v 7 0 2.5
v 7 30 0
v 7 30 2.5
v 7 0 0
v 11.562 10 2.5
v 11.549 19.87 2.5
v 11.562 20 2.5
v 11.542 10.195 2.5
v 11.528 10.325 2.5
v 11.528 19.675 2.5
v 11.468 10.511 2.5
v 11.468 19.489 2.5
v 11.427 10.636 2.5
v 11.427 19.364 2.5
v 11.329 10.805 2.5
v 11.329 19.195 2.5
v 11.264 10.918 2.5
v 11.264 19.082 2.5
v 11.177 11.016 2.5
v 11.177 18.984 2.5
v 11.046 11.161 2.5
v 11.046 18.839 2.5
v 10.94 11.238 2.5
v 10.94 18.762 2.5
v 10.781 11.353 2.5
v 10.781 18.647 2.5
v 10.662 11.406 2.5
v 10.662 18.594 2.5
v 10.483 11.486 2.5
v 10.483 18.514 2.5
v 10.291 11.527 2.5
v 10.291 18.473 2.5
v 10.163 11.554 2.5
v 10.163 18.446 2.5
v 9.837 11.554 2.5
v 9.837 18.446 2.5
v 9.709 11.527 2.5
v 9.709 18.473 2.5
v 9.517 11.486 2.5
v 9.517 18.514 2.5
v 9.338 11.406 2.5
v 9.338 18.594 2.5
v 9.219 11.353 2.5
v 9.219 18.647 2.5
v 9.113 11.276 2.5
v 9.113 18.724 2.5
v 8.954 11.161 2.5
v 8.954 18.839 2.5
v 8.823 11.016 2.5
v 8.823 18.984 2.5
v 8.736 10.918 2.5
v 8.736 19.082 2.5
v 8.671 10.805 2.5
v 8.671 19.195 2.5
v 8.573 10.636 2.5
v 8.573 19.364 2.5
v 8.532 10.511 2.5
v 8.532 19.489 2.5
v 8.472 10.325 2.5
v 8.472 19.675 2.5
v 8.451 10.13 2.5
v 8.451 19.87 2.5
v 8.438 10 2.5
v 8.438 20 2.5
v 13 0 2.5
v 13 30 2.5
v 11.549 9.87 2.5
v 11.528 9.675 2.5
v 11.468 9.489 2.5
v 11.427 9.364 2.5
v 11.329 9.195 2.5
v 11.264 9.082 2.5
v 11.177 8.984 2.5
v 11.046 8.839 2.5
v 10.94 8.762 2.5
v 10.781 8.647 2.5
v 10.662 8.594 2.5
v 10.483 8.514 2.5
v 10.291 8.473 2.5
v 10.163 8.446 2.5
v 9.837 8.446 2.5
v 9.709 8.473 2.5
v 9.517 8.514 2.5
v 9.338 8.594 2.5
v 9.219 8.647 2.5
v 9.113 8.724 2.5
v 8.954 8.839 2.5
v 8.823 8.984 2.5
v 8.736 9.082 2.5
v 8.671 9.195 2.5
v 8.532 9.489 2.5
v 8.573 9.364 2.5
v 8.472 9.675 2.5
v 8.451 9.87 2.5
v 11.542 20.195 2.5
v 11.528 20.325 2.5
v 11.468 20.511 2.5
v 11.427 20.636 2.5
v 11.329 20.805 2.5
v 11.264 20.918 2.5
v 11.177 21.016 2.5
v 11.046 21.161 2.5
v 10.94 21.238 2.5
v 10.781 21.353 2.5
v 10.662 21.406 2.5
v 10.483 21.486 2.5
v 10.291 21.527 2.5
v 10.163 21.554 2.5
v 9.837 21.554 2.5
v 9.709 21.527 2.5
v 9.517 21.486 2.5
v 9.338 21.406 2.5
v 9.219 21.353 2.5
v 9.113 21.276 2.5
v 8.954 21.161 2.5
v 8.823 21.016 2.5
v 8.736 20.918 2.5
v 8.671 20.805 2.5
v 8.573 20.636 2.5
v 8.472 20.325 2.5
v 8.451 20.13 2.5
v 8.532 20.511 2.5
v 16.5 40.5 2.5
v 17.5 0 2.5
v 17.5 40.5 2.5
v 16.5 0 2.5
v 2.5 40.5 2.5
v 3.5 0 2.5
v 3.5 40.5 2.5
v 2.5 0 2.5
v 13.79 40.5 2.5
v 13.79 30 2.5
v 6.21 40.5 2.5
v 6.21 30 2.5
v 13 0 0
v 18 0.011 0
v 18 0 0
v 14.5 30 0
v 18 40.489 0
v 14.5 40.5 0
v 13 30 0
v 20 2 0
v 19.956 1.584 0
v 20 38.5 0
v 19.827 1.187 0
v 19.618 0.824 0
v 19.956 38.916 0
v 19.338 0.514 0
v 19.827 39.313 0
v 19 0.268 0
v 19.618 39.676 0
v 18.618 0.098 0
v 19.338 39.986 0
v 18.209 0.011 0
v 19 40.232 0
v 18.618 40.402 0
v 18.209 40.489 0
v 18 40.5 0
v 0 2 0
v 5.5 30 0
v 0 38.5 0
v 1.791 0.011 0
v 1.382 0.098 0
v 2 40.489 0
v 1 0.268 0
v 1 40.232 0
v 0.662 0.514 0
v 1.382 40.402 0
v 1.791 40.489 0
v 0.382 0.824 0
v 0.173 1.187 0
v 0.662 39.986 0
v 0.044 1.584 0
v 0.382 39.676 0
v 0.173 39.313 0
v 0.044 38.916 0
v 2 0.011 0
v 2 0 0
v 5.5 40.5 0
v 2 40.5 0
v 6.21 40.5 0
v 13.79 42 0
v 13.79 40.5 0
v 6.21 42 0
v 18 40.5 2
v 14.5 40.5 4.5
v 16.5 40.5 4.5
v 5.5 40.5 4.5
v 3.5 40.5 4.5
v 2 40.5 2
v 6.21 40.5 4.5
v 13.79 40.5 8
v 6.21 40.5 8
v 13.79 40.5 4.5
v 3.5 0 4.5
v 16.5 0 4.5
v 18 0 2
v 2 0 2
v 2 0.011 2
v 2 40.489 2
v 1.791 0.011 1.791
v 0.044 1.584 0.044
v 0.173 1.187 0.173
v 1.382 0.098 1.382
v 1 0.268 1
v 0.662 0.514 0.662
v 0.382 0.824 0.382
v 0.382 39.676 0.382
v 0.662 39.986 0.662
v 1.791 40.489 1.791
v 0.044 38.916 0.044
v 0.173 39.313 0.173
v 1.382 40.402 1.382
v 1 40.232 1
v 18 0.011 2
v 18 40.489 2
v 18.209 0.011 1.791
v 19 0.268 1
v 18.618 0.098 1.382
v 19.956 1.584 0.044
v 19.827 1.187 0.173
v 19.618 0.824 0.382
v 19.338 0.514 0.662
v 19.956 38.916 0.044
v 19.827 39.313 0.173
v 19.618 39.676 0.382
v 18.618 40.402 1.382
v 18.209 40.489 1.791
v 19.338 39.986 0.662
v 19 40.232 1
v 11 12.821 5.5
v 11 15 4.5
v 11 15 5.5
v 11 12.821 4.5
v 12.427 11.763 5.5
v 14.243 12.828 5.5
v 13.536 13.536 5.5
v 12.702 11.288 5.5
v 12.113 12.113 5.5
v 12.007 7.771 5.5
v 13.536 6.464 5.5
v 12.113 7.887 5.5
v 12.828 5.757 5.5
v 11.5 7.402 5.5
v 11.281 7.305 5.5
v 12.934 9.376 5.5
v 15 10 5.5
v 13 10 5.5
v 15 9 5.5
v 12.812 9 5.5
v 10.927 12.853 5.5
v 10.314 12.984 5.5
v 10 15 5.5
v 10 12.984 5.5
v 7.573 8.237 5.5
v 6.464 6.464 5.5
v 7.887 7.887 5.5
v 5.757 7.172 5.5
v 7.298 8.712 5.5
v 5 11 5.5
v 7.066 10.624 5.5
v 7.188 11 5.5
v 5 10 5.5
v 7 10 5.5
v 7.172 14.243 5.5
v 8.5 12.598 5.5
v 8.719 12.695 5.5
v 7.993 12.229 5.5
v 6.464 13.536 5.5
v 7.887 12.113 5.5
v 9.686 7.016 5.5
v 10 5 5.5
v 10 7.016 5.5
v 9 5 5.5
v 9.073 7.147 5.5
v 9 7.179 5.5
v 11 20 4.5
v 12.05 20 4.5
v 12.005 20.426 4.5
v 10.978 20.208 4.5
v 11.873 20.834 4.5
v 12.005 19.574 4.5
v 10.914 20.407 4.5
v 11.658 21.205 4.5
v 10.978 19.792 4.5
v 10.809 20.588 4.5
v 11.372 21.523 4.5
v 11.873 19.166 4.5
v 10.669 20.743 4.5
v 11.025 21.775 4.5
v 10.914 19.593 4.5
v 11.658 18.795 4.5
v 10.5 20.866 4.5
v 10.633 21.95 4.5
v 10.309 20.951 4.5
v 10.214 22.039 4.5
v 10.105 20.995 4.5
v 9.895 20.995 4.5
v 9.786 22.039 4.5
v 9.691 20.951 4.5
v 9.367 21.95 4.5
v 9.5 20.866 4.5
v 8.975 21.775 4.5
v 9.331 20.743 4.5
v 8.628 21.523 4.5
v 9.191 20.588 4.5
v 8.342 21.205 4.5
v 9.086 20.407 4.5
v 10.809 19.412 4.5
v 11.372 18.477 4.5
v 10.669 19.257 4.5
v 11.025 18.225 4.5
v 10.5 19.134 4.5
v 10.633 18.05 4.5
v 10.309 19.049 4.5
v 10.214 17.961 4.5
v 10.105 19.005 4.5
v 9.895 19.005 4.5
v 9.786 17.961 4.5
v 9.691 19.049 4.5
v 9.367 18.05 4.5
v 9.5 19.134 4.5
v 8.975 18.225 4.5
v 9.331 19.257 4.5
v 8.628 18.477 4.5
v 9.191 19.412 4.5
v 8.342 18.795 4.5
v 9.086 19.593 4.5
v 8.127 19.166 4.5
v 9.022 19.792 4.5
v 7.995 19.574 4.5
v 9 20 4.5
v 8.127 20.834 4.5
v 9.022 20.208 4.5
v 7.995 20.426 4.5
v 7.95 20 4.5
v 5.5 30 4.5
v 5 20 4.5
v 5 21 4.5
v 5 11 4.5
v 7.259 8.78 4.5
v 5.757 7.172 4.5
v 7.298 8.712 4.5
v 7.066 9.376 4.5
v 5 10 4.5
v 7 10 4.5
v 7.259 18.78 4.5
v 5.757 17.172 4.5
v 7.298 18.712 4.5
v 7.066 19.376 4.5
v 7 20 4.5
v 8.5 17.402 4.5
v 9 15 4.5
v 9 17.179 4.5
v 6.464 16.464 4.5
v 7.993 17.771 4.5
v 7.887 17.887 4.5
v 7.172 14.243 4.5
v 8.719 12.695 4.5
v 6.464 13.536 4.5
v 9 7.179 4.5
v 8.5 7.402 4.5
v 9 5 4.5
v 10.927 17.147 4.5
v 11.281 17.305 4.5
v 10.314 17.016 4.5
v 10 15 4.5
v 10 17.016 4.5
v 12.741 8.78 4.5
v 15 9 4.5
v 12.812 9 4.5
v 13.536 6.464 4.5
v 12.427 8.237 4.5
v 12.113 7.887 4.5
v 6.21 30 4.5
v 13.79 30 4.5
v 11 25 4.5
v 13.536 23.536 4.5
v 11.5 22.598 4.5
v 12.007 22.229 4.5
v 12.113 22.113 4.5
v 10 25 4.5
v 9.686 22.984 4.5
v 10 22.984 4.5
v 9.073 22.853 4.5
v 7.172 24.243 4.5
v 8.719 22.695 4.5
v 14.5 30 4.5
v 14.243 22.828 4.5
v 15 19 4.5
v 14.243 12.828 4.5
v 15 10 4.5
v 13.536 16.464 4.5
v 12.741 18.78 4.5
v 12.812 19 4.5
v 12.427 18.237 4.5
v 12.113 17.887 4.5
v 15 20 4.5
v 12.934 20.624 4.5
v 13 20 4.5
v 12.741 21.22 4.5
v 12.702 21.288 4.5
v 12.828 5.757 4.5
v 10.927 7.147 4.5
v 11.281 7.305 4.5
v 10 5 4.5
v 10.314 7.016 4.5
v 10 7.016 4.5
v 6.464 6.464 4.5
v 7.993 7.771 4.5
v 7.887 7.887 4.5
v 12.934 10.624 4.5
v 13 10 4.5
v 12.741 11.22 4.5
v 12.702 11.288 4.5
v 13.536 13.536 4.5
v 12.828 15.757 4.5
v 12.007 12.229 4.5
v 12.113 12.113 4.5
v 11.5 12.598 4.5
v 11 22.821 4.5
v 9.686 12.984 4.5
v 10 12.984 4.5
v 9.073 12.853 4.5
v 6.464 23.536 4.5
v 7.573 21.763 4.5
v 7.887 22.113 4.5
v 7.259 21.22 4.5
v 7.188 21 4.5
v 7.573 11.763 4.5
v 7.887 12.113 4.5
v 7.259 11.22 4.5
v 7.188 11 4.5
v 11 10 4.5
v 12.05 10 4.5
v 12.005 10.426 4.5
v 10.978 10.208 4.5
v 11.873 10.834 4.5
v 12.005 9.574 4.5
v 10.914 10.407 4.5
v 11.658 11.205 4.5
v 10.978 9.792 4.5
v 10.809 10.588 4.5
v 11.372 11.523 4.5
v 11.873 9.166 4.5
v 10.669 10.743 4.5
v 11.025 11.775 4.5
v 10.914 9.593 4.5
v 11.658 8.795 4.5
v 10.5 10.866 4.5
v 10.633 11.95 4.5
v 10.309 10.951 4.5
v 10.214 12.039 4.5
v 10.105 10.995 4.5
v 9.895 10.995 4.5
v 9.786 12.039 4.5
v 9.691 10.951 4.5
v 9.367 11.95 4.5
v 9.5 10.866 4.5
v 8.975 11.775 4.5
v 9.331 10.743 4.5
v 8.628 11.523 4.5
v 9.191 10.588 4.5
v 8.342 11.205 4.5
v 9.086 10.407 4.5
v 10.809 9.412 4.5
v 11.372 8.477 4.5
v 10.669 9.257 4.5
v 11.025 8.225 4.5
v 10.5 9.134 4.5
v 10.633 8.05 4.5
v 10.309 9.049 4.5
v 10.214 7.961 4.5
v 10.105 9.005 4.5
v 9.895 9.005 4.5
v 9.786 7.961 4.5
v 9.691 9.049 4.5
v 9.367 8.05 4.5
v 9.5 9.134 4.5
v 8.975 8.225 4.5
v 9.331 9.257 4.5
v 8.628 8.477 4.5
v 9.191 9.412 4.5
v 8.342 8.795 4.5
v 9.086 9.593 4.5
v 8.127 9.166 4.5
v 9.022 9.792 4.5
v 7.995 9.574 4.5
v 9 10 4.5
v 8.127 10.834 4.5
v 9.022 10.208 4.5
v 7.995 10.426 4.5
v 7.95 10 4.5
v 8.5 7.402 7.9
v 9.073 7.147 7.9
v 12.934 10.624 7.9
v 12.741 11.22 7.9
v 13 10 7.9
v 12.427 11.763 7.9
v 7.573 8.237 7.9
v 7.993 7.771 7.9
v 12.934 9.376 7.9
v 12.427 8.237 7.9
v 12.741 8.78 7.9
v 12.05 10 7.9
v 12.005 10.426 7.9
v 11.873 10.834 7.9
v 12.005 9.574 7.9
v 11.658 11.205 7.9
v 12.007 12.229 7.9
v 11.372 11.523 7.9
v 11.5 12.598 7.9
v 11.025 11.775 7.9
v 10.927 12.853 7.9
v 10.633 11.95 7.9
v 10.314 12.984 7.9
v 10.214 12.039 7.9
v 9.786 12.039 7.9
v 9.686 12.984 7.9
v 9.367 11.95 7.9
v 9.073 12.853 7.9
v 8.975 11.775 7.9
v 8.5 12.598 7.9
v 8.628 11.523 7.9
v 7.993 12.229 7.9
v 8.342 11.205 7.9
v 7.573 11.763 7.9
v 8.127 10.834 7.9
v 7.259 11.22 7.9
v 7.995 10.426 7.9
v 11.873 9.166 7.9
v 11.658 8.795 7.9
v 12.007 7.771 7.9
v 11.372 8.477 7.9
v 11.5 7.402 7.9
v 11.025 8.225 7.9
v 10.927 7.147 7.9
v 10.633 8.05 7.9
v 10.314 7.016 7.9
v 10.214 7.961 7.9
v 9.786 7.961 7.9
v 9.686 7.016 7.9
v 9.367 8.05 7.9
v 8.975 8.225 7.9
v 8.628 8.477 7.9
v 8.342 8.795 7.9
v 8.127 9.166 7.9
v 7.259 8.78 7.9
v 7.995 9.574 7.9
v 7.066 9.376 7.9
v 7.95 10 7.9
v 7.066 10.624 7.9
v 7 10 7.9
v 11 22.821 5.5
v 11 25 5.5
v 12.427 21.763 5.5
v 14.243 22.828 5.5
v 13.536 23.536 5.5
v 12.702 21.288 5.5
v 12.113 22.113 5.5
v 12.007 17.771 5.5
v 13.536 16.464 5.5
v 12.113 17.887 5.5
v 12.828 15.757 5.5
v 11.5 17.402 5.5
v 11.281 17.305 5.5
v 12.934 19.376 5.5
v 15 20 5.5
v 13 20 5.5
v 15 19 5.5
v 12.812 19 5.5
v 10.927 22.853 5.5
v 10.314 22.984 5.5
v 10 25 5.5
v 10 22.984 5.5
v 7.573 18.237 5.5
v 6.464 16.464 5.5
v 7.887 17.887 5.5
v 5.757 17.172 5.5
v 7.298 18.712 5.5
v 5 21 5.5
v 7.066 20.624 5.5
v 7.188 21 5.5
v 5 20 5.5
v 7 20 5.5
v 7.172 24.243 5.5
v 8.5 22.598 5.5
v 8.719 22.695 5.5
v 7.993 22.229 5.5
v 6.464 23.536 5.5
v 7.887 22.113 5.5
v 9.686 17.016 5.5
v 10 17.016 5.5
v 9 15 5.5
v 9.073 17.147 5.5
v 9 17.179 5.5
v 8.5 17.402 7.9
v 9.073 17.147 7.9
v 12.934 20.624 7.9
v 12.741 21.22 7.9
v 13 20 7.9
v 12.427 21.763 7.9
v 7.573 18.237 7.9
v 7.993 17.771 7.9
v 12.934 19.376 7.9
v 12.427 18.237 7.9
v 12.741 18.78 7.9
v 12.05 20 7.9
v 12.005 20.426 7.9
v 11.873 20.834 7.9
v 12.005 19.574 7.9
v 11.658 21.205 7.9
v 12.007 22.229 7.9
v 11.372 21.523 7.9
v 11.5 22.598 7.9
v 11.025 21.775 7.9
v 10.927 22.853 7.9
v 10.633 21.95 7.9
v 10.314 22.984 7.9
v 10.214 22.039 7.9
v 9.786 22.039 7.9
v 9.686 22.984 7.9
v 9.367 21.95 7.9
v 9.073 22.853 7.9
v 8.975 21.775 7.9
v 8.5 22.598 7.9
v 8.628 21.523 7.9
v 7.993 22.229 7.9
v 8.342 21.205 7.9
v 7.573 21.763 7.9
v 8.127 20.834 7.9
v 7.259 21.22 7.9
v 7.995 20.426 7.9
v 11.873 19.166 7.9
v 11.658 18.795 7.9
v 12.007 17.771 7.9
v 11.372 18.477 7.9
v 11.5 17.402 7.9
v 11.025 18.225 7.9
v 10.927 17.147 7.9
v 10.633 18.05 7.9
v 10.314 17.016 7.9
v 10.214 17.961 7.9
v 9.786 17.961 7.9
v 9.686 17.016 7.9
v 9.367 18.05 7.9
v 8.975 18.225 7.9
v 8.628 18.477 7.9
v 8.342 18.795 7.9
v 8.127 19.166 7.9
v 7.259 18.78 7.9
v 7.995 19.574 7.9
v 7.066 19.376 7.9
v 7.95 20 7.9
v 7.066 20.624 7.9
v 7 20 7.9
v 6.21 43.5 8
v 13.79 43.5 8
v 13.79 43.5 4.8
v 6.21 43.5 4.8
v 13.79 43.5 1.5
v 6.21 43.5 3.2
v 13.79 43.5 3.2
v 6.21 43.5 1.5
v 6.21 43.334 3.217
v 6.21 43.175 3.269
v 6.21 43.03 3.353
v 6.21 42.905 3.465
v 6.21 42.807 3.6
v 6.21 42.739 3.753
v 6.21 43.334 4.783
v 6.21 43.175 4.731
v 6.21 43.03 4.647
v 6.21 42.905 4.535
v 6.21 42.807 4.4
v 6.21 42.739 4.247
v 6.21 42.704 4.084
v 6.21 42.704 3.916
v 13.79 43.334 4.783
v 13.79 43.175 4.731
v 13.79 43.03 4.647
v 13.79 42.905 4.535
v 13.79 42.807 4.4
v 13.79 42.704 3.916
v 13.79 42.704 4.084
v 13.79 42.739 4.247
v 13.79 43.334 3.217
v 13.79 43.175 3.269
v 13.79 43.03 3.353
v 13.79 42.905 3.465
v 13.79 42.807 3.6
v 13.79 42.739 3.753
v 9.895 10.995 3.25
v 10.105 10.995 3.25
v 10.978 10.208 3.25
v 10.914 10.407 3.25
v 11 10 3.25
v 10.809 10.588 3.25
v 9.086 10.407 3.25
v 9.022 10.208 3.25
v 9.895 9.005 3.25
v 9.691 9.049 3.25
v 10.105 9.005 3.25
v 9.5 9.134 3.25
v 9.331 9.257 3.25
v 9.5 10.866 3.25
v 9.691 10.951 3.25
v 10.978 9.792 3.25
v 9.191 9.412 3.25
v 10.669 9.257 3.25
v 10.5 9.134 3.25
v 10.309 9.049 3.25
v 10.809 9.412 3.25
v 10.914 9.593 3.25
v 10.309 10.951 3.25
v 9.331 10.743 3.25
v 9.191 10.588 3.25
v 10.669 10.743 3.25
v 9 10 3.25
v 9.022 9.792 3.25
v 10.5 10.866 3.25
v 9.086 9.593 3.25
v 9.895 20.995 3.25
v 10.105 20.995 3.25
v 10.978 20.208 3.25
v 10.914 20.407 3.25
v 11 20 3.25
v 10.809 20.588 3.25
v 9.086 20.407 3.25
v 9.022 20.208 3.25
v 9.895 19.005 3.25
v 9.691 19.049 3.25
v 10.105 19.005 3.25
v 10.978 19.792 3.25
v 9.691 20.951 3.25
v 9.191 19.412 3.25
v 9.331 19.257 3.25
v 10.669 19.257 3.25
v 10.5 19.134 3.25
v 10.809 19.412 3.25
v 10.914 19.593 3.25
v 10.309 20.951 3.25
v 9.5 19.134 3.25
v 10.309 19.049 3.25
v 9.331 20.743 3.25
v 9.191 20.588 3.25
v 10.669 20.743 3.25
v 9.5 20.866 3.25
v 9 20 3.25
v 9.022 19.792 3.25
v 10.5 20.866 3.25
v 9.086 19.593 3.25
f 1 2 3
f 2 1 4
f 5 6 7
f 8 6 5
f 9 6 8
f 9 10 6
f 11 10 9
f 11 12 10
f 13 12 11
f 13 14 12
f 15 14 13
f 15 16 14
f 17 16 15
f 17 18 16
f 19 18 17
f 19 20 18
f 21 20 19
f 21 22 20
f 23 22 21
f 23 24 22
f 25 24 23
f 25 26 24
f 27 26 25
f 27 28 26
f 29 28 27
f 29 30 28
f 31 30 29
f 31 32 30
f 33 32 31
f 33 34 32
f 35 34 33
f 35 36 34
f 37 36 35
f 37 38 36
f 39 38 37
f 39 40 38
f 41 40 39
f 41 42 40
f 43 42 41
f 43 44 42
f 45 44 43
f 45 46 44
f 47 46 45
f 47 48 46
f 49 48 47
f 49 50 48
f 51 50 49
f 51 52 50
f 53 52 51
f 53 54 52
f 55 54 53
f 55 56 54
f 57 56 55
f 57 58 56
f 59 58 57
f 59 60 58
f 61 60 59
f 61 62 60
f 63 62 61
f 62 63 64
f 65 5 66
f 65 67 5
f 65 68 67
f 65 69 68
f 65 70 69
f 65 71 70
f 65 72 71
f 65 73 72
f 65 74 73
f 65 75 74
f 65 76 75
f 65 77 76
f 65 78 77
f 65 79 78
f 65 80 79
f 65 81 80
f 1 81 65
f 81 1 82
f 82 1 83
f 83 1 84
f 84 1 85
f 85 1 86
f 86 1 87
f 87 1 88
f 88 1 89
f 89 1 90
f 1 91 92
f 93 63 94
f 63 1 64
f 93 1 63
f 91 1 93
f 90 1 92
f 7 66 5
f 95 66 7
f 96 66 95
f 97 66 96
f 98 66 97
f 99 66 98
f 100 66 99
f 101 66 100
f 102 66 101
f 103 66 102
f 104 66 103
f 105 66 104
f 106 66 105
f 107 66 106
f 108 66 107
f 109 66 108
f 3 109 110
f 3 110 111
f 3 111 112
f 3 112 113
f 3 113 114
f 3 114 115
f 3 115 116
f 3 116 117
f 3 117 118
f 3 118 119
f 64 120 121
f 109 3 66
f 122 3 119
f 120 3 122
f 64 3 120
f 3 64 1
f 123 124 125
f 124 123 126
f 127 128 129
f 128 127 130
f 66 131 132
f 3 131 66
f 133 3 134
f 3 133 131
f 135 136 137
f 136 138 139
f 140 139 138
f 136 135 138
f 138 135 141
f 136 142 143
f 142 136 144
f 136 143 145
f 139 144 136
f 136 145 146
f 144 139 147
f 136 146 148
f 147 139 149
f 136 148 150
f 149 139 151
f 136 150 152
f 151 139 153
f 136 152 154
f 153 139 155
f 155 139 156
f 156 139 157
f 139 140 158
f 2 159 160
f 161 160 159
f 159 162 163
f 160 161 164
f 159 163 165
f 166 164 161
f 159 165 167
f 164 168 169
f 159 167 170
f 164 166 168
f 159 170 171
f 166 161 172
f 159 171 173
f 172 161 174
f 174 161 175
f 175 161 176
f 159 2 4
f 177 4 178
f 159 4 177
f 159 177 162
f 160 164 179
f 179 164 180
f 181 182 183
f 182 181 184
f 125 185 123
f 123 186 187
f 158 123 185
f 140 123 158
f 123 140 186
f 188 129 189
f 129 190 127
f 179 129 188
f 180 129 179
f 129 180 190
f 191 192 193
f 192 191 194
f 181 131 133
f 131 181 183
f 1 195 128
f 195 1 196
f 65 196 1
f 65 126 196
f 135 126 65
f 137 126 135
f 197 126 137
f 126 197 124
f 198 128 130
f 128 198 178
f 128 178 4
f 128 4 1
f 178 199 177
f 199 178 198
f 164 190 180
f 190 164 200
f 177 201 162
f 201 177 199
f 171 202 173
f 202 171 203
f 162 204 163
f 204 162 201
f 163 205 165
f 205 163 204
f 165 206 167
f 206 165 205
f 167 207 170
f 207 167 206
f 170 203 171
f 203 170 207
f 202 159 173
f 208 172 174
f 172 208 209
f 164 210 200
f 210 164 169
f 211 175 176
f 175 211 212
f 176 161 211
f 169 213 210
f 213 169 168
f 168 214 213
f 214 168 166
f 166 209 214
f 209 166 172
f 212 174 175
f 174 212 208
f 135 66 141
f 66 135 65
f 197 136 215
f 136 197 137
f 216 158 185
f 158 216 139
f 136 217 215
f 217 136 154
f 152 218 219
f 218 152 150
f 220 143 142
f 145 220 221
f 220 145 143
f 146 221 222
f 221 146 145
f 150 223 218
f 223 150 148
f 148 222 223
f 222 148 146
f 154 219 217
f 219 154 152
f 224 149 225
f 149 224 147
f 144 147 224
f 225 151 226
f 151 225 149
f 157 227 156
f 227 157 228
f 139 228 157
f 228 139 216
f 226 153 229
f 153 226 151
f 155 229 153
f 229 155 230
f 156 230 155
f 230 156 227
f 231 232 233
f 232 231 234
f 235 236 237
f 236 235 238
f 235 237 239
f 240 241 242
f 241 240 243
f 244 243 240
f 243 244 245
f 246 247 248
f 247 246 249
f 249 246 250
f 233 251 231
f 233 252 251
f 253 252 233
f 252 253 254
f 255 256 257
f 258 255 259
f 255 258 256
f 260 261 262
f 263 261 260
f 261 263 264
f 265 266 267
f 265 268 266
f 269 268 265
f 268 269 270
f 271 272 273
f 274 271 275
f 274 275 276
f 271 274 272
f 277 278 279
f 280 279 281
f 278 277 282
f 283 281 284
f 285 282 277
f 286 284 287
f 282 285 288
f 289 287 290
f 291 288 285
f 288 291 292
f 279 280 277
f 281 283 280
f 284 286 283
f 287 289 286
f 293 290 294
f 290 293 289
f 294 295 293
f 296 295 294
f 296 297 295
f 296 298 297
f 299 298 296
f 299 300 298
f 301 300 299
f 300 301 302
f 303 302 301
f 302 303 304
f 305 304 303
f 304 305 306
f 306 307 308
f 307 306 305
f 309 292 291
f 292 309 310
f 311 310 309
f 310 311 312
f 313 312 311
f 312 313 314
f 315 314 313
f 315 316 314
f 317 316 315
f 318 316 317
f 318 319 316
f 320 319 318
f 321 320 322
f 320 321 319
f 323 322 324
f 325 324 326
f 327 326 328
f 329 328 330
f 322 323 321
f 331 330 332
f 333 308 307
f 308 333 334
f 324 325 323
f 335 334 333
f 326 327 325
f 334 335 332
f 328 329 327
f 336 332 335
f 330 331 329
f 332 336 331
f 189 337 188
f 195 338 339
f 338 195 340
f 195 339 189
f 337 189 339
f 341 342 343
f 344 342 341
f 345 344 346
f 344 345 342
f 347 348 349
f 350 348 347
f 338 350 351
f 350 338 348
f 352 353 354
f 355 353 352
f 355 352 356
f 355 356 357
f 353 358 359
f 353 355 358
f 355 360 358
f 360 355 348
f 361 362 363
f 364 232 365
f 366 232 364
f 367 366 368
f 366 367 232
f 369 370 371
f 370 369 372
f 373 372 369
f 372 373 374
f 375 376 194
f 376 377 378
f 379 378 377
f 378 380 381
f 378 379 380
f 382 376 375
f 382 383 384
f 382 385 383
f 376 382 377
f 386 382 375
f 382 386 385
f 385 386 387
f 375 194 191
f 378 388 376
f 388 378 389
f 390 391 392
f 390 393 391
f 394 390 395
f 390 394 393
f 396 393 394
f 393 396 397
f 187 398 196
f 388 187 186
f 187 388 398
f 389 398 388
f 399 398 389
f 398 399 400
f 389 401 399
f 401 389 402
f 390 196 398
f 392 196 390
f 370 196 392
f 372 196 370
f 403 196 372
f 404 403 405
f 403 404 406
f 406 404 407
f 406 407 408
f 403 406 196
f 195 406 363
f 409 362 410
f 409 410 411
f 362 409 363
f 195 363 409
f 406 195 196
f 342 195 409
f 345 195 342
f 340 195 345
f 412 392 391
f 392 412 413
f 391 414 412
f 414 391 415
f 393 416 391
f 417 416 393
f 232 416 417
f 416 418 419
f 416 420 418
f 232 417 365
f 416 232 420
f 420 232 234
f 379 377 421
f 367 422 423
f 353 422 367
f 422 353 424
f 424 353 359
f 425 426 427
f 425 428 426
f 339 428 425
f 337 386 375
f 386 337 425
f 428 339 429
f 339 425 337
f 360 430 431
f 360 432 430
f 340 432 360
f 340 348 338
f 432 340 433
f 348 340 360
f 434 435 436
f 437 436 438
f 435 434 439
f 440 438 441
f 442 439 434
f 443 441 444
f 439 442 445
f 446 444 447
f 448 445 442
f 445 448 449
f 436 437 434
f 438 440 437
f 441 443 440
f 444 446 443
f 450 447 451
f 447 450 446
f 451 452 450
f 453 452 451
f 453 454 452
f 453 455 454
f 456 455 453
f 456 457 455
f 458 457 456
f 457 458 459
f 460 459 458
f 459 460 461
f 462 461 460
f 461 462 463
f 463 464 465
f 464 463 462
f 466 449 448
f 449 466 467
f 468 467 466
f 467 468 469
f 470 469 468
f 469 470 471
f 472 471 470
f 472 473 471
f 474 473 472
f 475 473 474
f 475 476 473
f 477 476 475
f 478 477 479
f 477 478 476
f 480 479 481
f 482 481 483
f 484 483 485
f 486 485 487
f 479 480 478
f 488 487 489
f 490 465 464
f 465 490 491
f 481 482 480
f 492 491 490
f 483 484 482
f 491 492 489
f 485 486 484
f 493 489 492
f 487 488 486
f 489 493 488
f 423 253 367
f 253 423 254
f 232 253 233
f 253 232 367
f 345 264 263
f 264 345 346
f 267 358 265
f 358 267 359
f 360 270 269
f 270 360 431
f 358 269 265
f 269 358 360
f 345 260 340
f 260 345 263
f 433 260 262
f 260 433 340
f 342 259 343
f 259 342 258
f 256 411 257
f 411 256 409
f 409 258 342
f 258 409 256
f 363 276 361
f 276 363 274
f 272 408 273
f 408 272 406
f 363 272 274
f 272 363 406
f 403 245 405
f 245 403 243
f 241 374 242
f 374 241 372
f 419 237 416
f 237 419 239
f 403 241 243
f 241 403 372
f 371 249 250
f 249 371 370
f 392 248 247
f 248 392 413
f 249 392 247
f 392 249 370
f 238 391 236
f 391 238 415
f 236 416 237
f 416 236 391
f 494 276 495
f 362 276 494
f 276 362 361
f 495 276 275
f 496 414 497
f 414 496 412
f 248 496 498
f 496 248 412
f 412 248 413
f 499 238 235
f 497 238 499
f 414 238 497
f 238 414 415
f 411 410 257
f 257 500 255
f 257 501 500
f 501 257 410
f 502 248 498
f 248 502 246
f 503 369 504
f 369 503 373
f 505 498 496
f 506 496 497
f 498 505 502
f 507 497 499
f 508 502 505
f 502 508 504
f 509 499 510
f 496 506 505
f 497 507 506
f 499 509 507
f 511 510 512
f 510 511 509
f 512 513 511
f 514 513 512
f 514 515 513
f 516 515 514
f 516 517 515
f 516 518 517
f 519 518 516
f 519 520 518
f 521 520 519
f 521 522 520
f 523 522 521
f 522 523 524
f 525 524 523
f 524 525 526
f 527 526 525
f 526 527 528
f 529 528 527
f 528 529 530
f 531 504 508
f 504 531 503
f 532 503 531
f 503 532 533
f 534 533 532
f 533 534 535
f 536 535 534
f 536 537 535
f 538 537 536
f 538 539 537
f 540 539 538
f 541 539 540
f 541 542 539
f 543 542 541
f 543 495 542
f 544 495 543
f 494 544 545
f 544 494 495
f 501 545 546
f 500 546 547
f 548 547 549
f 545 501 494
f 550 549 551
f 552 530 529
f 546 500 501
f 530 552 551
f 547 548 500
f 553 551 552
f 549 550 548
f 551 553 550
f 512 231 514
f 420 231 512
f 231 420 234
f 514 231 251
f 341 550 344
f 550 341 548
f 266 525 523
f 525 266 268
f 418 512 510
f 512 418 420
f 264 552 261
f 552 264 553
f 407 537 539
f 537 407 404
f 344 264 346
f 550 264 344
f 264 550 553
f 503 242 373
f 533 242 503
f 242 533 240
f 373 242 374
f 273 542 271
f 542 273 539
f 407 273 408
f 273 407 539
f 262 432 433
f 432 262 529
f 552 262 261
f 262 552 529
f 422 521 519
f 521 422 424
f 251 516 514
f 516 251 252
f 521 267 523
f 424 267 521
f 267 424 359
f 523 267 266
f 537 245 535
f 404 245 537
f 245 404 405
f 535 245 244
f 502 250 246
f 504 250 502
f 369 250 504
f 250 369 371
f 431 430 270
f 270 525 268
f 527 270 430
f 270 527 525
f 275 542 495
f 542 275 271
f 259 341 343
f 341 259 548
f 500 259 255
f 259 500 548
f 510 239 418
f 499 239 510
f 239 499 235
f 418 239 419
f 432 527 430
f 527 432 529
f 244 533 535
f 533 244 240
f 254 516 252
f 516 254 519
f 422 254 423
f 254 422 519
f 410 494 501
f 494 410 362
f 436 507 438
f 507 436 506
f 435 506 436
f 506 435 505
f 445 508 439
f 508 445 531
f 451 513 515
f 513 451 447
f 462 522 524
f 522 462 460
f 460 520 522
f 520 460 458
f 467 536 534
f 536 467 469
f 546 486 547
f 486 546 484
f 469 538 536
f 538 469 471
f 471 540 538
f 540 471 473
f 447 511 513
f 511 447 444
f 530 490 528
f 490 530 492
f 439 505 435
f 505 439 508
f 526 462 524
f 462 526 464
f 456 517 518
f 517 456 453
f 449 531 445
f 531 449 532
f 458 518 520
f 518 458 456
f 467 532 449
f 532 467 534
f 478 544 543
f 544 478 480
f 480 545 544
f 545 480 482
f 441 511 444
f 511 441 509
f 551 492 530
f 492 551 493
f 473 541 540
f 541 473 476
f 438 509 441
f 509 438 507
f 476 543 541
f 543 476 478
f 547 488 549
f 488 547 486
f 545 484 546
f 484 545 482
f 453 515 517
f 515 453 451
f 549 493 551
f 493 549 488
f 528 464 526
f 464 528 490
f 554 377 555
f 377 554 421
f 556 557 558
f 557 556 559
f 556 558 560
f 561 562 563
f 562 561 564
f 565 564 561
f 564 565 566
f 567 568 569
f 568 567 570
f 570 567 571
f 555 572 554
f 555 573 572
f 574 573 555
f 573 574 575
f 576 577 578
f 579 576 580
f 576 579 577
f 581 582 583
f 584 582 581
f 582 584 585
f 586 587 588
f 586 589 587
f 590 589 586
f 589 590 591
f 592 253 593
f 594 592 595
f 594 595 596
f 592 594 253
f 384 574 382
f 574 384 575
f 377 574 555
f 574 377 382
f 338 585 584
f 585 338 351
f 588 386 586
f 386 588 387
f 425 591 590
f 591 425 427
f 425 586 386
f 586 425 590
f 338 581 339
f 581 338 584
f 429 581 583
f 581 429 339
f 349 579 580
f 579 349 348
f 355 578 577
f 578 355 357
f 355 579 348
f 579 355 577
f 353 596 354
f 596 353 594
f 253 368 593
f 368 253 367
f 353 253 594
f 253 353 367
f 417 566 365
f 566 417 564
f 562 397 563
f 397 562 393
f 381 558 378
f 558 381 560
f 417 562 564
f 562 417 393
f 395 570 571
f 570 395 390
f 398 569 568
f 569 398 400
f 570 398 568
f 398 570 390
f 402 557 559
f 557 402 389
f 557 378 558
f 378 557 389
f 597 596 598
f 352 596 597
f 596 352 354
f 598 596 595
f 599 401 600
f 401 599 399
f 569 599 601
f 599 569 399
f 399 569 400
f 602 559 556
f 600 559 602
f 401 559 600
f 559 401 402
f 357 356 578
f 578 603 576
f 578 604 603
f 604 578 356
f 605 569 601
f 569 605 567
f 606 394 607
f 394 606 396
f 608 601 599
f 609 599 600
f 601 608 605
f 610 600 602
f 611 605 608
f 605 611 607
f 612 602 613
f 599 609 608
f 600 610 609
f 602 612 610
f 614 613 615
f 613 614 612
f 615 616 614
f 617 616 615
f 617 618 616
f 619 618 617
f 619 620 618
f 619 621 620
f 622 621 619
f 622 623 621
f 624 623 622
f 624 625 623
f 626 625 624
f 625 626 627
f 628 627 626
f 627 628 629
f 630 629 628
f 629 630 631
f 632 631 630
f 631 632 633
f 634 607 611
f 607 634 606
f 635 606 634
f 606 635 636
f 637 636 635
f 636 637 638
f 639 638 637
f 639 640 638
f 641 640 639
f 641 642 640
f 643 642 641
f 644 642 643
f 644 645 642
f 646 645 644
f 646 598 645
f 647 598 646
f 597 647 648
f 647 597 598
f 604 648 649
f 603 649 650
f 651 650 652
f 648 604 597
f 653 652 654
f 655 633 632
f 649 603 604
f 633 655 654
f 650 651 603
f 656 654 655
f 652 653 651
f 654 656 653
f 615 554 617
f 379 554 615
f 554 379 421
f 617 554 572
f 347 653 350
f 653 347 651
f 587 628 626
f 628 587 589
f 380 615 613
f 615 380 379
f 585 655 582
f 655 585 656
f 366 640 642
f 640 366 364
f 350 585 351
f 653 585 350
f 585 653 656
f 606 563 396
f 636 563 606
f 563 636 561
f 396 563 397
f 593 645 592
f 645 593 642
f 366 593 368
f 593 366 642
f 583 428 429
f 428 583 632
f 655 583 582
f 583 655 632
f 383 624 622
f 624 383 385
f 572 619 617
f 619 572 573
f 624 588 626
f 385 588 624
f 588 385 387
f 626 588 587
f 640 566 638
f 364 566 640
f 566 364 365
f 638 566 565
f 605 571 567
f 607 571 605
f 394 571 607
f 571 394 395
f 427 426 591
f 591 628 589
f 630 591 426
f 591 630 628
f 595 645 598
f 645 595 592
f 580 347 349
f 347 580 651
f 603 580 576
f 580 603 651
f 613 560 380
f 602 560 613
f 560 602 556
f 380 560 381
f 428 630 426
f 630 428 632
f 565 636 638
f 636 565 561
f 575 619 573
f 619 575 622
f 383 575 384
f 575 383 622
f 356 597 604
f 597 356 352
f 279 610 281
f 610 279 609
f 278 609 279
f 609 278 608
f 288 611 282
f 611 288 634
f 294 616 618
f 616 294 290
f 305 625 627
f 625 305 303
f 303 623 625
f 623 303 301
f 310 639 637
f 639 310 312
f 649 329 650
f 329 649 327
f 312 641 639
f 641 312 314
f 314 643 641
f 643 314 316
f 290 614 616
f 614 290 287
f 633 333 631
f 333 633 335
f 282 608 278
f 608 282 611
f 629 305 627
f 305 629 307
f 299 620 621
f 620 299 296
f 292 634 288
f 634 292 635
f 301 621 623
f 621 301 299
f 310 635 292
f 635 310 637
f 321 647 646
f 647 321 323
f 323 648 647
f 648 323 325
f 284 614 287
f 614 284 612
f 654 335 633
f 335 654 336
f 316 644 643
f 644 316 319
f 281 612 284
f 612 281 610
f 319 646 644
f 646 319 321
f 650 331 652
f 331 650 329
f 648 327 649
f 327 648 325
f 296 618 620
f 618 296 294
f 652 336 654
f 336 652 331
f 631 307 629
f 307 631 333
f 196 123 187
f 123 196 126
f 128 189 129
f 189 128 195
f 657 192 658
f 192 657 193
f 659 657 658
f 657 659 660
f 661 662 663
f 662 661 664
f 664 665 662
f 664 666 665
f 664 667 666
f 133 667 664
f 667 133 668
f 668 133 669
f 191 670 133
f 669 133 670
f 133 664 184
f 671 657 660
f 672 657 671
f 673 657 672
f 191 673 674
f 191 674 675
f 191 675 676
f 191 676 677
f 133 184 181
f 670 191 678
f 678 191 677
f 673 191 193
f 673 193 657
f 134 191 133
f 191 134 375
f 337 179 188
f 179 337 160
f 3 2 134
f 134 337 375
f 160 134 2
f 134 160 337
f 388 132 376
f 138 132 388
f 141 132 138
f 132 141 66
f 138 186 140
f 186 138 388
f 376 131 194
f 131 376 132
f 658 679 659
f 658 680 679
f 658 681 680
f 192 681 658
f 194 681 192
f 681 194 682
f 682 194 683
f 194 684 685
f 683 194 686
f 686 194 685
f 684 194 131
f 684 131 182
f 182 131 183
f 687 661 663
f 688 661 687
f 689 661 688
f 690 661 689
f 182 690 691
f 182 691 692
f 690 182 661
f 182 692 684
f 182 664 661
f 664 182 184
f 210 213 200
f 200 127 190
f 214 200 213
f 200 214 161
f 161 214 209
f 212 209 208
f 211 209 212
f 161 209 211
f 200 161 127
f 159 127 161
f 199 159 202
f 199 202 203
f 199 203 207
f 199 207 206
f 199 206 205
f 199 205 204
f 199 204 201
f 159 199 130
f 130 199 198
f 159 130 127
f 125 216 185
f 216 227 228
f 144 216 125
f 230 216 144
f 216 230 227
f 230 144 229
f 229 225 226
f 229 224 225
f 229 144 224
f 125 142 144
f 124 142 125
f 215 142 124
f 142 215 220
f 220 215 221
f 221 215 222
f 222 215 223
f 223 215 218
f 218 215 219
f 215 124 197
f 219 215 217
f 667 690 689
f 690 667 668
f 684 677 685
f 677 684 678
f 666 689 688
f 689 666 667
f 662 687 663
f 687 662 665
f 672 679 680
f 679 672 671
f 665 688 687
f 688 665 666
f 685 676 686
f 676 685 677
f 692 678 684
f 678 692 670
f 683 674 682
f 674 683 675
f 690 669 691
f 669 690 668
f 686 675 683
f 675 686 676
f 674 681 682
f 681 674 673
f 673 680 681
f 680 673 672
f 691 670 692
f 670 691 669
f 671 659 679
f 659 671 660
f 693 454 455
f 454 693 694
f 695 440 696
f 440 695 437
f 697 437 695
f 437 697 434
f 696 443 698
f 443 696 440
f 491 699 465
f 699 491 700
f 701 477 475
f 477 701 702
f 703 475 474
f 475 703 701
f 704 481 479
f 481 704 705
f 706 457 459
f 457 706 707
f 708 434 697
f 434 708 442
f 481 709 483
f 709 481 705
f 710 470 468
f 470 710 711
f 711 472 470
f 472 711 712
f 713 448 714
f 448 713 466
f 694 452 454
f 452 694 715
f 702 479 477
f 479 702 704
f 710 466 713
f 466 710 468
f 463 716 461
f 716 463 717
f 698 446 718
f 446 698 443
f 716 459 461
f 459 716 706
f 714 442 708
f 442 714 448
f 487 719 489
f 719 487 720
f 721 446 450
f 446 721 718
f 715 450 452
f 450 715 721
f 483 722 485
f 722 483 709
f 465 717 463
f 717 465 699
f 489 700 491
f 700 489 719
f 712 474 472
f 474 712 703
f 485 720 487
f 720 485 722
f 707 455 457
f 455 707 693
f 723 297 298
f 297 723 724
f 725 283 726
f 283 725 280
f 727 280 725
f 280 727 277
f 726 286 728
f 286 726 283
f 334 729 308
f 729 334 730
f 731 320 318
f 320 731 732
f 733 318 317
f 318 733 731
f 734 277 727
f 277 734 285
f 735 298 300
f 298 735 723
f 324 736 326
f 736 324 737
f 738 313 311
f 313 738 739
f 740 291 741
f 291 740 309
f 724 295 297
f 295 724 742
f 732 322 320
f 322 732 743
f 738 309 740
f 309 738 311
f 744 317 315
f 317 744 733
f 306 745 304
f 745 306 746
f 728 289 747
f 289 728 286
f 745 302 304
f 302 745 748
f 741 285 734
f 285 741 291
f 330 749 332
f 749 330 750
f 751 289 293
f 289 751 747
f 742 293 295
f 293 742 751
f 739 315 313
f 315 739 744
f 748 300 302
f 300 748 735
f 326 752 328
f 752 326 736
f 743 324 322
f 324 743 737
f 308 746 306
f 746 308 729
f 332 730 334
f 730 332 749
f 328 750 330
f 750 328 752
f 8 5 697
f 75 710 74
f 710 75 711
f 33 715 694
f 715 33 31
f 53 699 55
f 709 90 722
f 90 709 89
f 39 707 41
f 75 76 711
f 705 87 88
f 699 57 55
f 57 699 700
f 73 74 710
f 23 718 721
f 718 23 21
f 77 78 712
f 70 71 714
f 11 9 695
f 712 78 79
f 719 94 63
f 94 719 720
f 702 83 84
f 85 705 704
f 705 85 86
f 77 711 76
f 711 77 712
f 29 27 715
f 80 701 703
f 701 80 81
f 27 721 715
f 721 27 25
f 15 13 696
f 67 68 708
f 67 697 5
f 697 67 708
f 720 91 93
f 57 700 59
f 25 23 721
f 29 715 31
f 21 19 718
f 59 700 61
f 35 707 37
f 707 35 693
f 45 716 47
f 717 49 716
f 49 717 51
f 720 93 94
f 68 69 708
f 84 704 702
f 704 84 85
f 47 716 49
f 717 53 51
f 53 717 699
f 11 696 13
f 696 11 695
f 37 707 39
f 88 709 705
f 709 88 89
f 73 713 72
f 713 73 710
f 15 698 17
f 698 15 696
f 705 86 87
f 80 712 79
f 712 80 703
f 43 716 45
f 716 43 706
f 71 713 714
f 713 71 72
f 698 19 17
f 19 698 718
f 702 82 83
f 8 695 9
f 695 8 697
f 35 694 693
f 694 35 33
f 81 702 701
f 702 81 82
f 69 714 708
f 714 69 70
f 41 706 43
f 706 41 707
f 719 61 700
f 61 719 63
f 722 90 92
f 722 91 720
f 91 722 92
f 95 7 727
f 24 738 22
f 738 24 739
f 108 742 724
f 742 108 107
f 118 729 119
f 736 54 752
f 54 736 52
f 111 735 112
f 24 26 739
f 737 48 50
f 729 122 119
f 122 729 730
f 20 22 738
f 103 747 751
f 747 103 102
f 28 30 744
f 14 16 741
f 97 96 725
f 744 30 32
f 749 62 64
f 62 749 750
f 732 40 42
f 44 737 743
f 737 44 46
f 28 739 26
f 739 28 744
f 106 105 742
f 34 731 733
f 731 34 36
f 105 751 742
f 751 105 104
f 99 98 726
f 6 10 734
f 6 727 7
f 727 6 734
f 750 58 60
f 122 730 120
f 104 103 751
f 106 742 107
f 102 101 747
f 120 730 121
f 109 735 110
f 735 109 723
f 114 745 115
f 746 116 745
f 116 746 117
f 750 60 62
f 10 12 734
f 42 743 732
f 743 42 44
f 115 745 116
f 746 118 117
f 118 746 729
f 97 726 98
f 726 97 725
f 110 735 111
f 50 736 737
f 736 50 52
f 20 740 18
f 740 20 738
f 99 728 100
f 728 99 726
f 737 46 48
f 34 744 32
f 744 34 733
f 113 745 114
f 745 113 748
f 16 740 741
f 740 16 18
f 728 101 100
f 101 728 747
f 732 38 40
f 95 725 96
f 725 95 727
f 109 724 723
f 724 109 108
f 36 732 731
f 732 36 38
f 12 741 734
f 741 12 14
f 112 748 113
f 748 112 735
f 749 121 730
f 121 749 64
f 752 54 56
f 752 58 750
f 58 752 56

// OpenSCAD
// Catepilar S61 - Clip to hold Military Case
// 2026-04-13, Ondrej DURAS (dury) NOKIA
// prichytenie mobilu : priviazane o snurku drzi vojenske ocharrne puzro na mobilny telefon CatS61
// dva moduly; slider - spodna zasuvna cast a cover - zakrytka zvierajuca snurku k slideru.
// pevne pojenie bude realizovane dvoma samoreznymi skrutkami
//include <003-roundedCube-lib.scad>

/* [Viever] */
preview="basic";    // [basic,cover,slider,plate]
distance=5;        // [0:1:50] vzdialenost kritky od podlozky
$fn=30;

/* [Dimensions] */
spi=0.1;            // spacing povrchu vnutornej suciatky sucheho spoja - pravidlo: I sa strka do O
spo=0.1;            // spacing povrchu vonkajsej suciastky sucheho spoja - I treba obvikle zuzit, O rozsirit aby sa veci do seba dali zasunut
roundedRadius=2.0;  // polomer zabrusenia hran slidera
roundedRadiusBig=4.5; 
sliderDepthM=40.5;  // celkova hlbka Slidera ... v podstate sirka, hlavny rozmer
sliderDepthL=30.0;  // hlbka lavej(blizsie k X)-celistvej casti slidera
sliderDepthR=10.5;  // hlbka pravej(dalej od X)-zarezanej casti slidera 
sliderWidthM=20.0;  // celkova sirka slidera
sliderWidthT=13.0;  // sirka horneho-noseneho pasu slidera
sliderWidthB=7.0;   // sirka spodneho-leziaceho pasika slidera (su dva, kazdy 6.0mm podla originalu, ale skusime 7.0mm)
sliderHightM=4.5;   // celkova vyska slidera - oboch pasikov dohromady (B+T=M !!!)
sliderHightB=2.5;   // vyska spodnych-leziacich dvoch pasikov slidera
sliderHightT=2.0;   // vyska horneho-noseneho pasika slidera
sliderCutLen=10.5;  // dlzka zarezu do slidera .. su dva
sliderCutTck=0.71;  // hrubka (Tick) zarezu do sldera .. su dva (merany original 1.5, 1.51 funkcny)
sliderCutDis=5.5;   // vzdialenost okraja zarezu od okraja slidera
sliderTipWid=8.0;   // sirka drziaceho hrotu i vyhynacieho jazycka (8.0 funkcny)
sliderTipDis=6.0;   // okraj jazycka/hrotu od okraja slidera // druhy okraj vyrezu // =poloha+sirka vyrezu
sliderTipDep=3.0;   // v podstate hrubka hrotu
sliderTipHig=8.0;   // vyska hrotu od podlozky
sliderCylRad=8.0;   // polomer cylindra, sluziaceho k pruznemu vyrezu
screwBodyM=2.0;     // priemer tela skrutky asi 2.0mm, este premerat
screwHeadM=5.0;     // ten najvacsi priemer hlavy skruptky, merany na asi 5.0, premerat este raz
screwHeadH=2.0;     // vyska hlavy skrutky
ferulaTick=1.0;     // hrubka steny ferule, teda kuzela s dierou, do ktorej pojde skrutka
ferulaHolders=8;    // pocet drziacikov, ktore zvysuju pevnost refule - zvacsuju plochu zakladne ktorou vznika prepoj medzi ferulou a suciastkou
ferulaHight=7.0;    // REFERENCNY rozmer - vyska vnutorneho pristoru pod coverom/krytkou ... urcuje vysku krytku
coverTick=2.0;      // hrubka materialu cover-a
cbArm=80.0;         // dlzka paky pacidla
cbTip=5.0;          // dlzka hrotu pacidla
cbRad=5.0;          // polomer zaoblenia pacidla
cbExt=5.0;          // sirka pacidla



/* [Colors] */
colorSliderBottom="#908010"; // farba spodnych dvoch pasikov slidera
colorSliderTop="#706008";    // farba horneho pasika slidera
colorFerulaFemale="#701010"; // Farba valcovej objimky na slideri, ktora do ktorej sa zasunie FerulaMale z covera
colorFerulaMale="#108080";   // Farba valcovej objimky na coveri s dierou, do ktorej pojde pridrzajuca skrutka
colorScrew="#108020";        // farba skrutky
colorCover="#407040";        // farba krytky/cover-a
colorCrowBar="#105030";      // farba pacidla ... je nepodstatna


module crowBar(Arm=cbArm,Tip=cbTip,Rad=cbRad,Ext=cbExt) {
    linear_extrude(Ext) {
    union() {
        translate([0,0,0])      // Tip - polygon hrotu
            polygon([[0,0],[Tip,0],[Tip,Rad]],[[0,1,2]]);
        translate([Tip,Rad])    // Arm - rameno pacidla
            square([Rad,Arm]);
        difference() {          // zaoblena cast stvrtkruh/stcrtvalec
            translate([Tip,Rad])
                circle(r=Rad);  // zakladny kruh, z ktoreho rezeme stvorec a obdlznik
            translate([0,0])
                square([Tip,2*Rad]); // urezanie 2. a 3. kvadrantu kruhu
            translate([Tip,Rad])
                square([Rad,Rad]);   // urezanie 1. kvadrandu. Ostava iba 4.-ty kvadrant.
        } //diff
    } // union
    } //Ext
}

module ferulaFemale() {
    difference() {
        union() {
            cylinder(h=ferulaHight/2-spi,d=screwBodyM+4*ferulaTick);
            for(i=[0:360/ferulaHolders:360]) {
                rotate([0,0,i])
                cube([ferulaTick,screwBodyM+3*ferulaTick,ferulaTick]);
            }
        }
        translate([0,0,-1])
        cylinder(h=ferulaHight/2-spi+2,d=screwBodyM+2*ferulaTick+spo);
    }
}
module ferulaMale() {
    difference() {
        union() {
            cylinder(h=ferulaHight/2-spi,d=screwBodyM+4*ferulaTick);
            for(i=[0:360/ferulaHolders:360]) {
                rotate([0,0,i])
                cube([ferulaTick,screwBodyM+3*ferulaTick,ferulaTick]);
            }
            cylinder(h=ferulaHight-spi,d=screwBodyM+2*ferulaTick-spi);
        }
        translate([0,0,-1])
        cylinder(h=ferulaHight-spi+2,d=screwBodyM);
    }
    
}

module roundedCoverUp(w,d,h,r1,r2) {  // sirka, hlbka/dlzka, vyska/hrubka, polomer velkeho zaoblenia, polomer malych hran
    union() {
    difference() {
        cube([w,d,h]);
        translate([-1,d-r1,h-r1])
            cube([w+2,r1+1,r1+1]);      // vyrez pre velke zaoblenie (vzadu hore)
        translate([-1,-1,h-r2])
            cube([r2+1,d+2,r2+1]);  // lavy horny vyrez pre okrajove zaoblenie
        translate([w-r2,-1,h-r2])
            cube([r2+1,d+2,r2+1]);  // pravy horny vyrez pre okrajove zaoblenie
        translate([-1,d-r2,-1])
            cube([r2+1,r2+1,h+2]);  // vyrez pre zaoblenie vlavo vzadu
        translate([w-r2,d-r2,-1])
            cube([r2+1,r2+1,h+2]);  // vyrez pre zaoblenie vpravo vzadu
    } // diff
        translate([r2,d-r1,h-r1])
            rotate([0,90,0])
            cylinder(h=w-2*r2,r=r1); // velke zaoblenie vzadu hore
        translate([r2,0,h-r2])
            rotate([-90,0,0])       // lave horne zaoblenie
            cylinder(h=d-r1,r=r2);
        translate([w-r2,0,h-r2])
            rotate([-90,0,0])       // prave horne zaoblenie
            cylinder(h=d-r1,r=r2);
        translate([r2,d-r2,0])
            cylinder(h=h-r1,r=r2);  // lave zadne zaoblenie
        translate([w-r2,d-r2,0])
            cylinder(h=h-r1,r=r2);  // prave zadne zaoblenie


        translate([r2,d-r1,h-r1])   // velke zaoblenie v lavom hornom rohu
            rotate([0,-90,0])
            //rotate_extrude(angle=90,start=0,convexity=100)
            rotate_extrude(angle=90,convexity=20)
                translate([r1-r2,0,0])
                circle(r=r2);

        translate([w-r2,d-r1,h-r1])   // velke zaoblenie v lavom hornom rohu
            rotate([0,-90,0])
            //rotate_extrude(angle=90,start=0,convexity=100)
            rotate_extrude(angle=90,convexity=20)
                translate([r1-r2,0,0])
                circle(r=r2);

        translate([0,d-r1,h-r1])  // vyplnenie dier na velkom zaobleni z oboch stran pomocou valca
            rotate([0,90,0])
            cylinder(h=w,r=r1-r2);
    } // union
}

module roundedCoverDown(w,d,h,r1,r2) {  // zaoblena krytka otocena dnom dole v zakladnej polohe
                                        //sirka,hlbka/dlzka,vyska/hrubka,polomer velkeho zaoblenia vzadu,polomer malych zaobleni po stranach
                                        // z pohladu komponent zjednodusena ...ovsem nedokonala verzia
    union() {
    difference() {
        cube([w,d,h]);             // zakladny kvader
        translate([r2-0.1,d-r1,-1])
            cube([w-2*r2+0.2,r1+1,r1+1]);  //vyrez pre velke zaoblenie

        translate([-1,-1,-1])
            cube([r2+1,d+2,r2+1]);  // lavy dolny vyrez
        translate([w-r2,-1,-1])
            cube([r2+1,d+2,r2+1]); //pravy dolny vyrez
        translate([-1,d-r2,-1])
            cube([r2+1,r2+1,h+2]);  // lavy zadny vyrez 
        translate([w-r2,d-r2,-1])
            cube([r2+1,r2+1,h+2]);  // lavy zadny vyrez 
        
    } //diff
        translate([r2,0,r2])
            rotate([-90,0,0])
            cylinder(h=d-r1,r=r2);  // lave dolne zaoblenie
        translate([w-r2,0,r2])
            rotate([-90,0,0])
            cylinder(h=d-r1,r=r2);  // prave dolne zaoblenie
        translate([r2,d-r2,r1])
            cylinder(h=h-r1,r=r2);  // lave zadne zaoblenie
        translate([w-r2,d-r2,r1])
            cylinder(h=h-r1,r=r2);  // prave zadne zaoblenie
        translate([r2,d-r1,r1])
            rotate([0,90,0])
            cylinder(h=w-2*r2,r=r1);  // zadne dolne velke zaoblenie


        translate([r2,d-r1,r1])   // velke zaoblenie v lavom hornom rohu
            rotate([0,90,0])
            //rotate_extrude(angle=90,start=0,convexity=100)
            rotate_extrude(angle=90,convexity=20)
                translate([r1-r2,0,0])
                circle(r=r2);

        translate([w-r2,d-r1,r1])   // velke zaoblenie v lavom hornom rohu
            rotate([0,90,0])
            //rotate_extrude(angle=90,start=0,convexity=100)
            rotate_extrude(angle=90,convexity=20)
                translate([r1-r2,0,0])
                circle(r=r2);

    } //union
}
module roundedCubeHightLeft(w=sliderWidthB,d=sliderDepthM,h=sliderHightB,r=roundedRadius) {
    union() {
        difference() {
            cube([w,d,h],center=false);  //zakladny kvader, ktory sa ide orezavat
            translate([-1,-1,-1])
                cube([r+1,r+1,h+2]);     // vyrez vlavo vpredu
            //translate([w-r,-1,-1])            
            //    cube([r+1,r+1,h+2]);   // vyrez vpravo vpredu
            translate([-1,d-r,-1])
                cube([r+1,r+1,h+2]);     // vyrez vlavo vzadu
            //translate([w-r,d-r,-1])
            //    cube([r+1,r+1,h+2]);   // vyrez vpravo vzadu
        } // difference
            translate([r,r,0])
                cylinder(h=h,r=r);       // cylinder zaoblenia vlavo vpredu
            //translate([w-r,r,0])            
            //    cylinder(h=h,r=r);     // cylinder zaoblenia vpravo vpredu
            translate([r,d-r,0])
                cylinder(h=h,r=r);       // cylinder zaoblenia vlavo vzadu
            //translate([w-r,d-r,0])
            //    cylinder(h=h,r=r);     // cylinder zaoblenia vpravo vzadu
    } // union

}

module roundedCubeHightRight(w=sliderWidthB,d=sliderDepthM,h=sliderHightB,r=roundedRadius) {
    union() {
        difference() {
            cube([w,d,h],center=false);  //zakladny kvader, ktory sa ide orezavat
            //translate([-1,-1,-1])
            //    cube([r+1,r+1,h+2]);   // vyrez vlavo vpredu
            translate([w-r,-1,-1])            
                cube([r+1,r+1,h+2]);     // vyrez vpravo vpredu
            //translate([-1,d-r,-1])
            //    cube([r+1,r+1,h+2]);   // vyrez vlavo vzadu
            translate([w-r,d-r,-1])
                cube([r+1,r+1,h+2]);     // vyrez vpravo vzadu
        }
            //translate([r,r,0])
            //    cylinder(h=h,r=r);     // cylinder zaoblenia vlavo vpredu
            translate([w-r,r,0])            
                cylinder(h=h,r=r);       // cylinder zaoblenia vpravo vpredu
            //translate([r,d-r,0])
            //    cylinder(h=h,r=r);     // cylinder zaoblenia vlavo vzadu
            translate([w-r,d-r,0])
                cylinder(h=h,r=r);       // cylinder zaoblenia vpravo vzadu
    }

}

module slider() {  // spodna zasuvacia cast 
// zakladnou polohou je poloha na plate
// referencny bod je vlavo dole v zadu
    difference() {
    union() {
        color(colorSliderBottom)
        translate([0,0,0])
            //cube([sliderWidthB,sliderDepthM,sliderHightB]); // lavy leziaci pasik
            roundedCubeHightLeft(sliderWidthB,sliderDepthM,sliderHightB,2); // lavy leziaci pasik
        color(colorSliderBottom)
        translate([sliderWidthM-sliderWidthB,0,0])
            //cube([sliderWidthB,sliderDepthM,sliderHightB]); // pravy leziaci pasik
            roundedCubeHightRight(sliderWidthB,sliderDepthM,sliderHightB,2); // pravy leziaci pasik
        color(colorSliderTop)
        translate([(sliderWidthM-sliderWidthT)/2,0,sliderHightB])
            cube([sliderWidthT,sliderDepthM,sliderHightT]); // horny noseny pasik
        color(colorSliderTop)
        translate([sliderTipDis,sliderDepthM,0]) // hlavny kvader hrotu prichytenia, z kvoreho sa bude rezat
            cube([sliderTipWid,sliderTipDep,sliderTipHig]);


        color(colorSliderBottom)                            // prva ferula od predneho okraja
            translate([sliderWidthM/2,1*sliderDepthL/3,sliderHightM])
            ferulaFemale();
        color(colorSliderBottom)                            // druha ferula od predneho okraja
            translate([sliderWidthM/2,2*sliderDepthL/3,sliderHightM])
            ferulaFemale();
    } //union
        color(colorSliderTop)
        translate([sliderCutDis,sliderDepthL,-1])
            cube([sliderCutTck,sliderDepthR+sliderTipDep+1,sliderTipHig+2]); // lavy zarez
        color(colorSliderTop)
        translate([sliderWidthM-sliderCutDis-sliderCutTck,sliderDepthL,-1])
            cube([sliderCutTck,sliderDepthR+sliderTipDep+1,sliderTipHig+2]); //pravy zarez
        color(colorSliderTop)
        //translate([sliderTipDis,sliderDepthM-sliderDepthR/2,sliderCylRad+sliderHightM-1])
        //    rotate([0,90,0])
        //    cylinder(h=sliderTipWid,r=sliderCylRad); // valcovity vyrez, ktory by mal umoznit pruznost
        color(colorSliderTop)
        translate([0,sliderDepthM+sliderTipDep/2,0])
            rotate([-45,0,0])
            cube([sliderWidthM,sliderTipDep,sliderTipHig]); // skosenie hrotu prichytenia
        color(colorSliderBottom)
            rotate([0,45,0])
            translate([-sliderHightB,-1,0])
            cube([sliderHightB,sliderDepthM+2,sliderHightM]); // skosenie lavej strany slidera
        color(colorSliderBottom)
            translate([sliderWidthM,-1,0])
            rotate([0,-45,0])
            cube([sliderHightB,sliderDepthM+2,sliderHightM]); // skosenie pravej strany slidera
        color(colorSliderTop)
            translate([sliderTipDis,sliderDepthM+sliderTipDep,sliderTipHig/2])
            rotate([0,90,0])
            cylinder(h=sliderTipWid,d=sliderTipHig/5);
        color(colorSliderBottom)                            // diera pre prvu skrutku od predneho okraja
            translate([sliderWidthM/2,1*sliderDepthL/3,0])
            cylinder(h=sliderHightM+1,d=screwBodyM);
        color(colorSliderBottom)                            // diera pre druhu skrutku od predneho okraja
            translate([sliderWidthM/2,2*sliderDepthL/3,0])
            cylinder(h=sliderHightM+1,d=screwBodyM);

        color(colorScrew)                                   // vyhlbenie pre hlavu prvej skrutky od predneho okraja
            translate([sliderWidthM/2,1*sliderDepthL/3,sliderHightB/2])
            cylinder(h=screwHeadH,d1=screwHeadM,d2=screwBodyM);
        color(colorScrew)                                   // vyhlbenie pre hlavu druhej skrutky od predneho okraja
            translate([sliderWidthM/2,2*sliderDepthL/3,sliderHightB/2])
            cylinder(h=screwHeadH,d1=screwHeadM,d2=screwBodyM);

        color(colorSliderTop)
            translate([sliderTipDis-spi,sliderDepthL,-spi]) // odrezanie z bocnych leziacich pasikov, aby noseny pasik nemal nepruzne supporty
            cube([sliderTipWid+2*spi,sliderDepthR,sliderHightB+spi]);
    } //diff

}

module cover() {   // zakrytka zvierajuca snurku k zasuvacej casti
// zakladnou polohou je poloha na plate, teda chrbatom dole.
// referencny bod je vlavo dole v zadu na chrbate
    union() {
    difference() {
        color(colorCover)
            roundedCoverDown(sliderWidthT,sliderDepthL,ferulaHight+coverTick,roundedRadiusBig,roundedRadius);
        color(colorCover)
            translate([coverTick,-1,coverTick])
            roundedCoverDown(sliderWidthT-2*coverTick,sliderDepthL-coverTick+1,ferulaHight+coverTick,roundedRadiusBig,roundedRadius);
    } //diff
        color(colorSliderBottom)                            // prva ferula od predneho okraja
            translate([sliderWidthT/2,1*sliderDepthL/3,coverTick])
            ferulaMale();
        color(colorSliderBottom)                            // druha ferula od predneho okraja
            translate([sliderWidthT/2,2*sliderDepthL/3,coverTick])
            ferulaMale();
    } //union
}

if(preview=="basic") {
    slider();     
}
if(preview=="slider") {
    slider();
}
if(preview=="cover") {
    cover();
}
if(preview=="plate") {
    translate([0,0,0])
        slider();

    translate([sliderWidthM+distance,0,0])
        cover();

    color(colorCrowBar)
    translate([sliderWidthM+distance+sliderWidthT+distance,0,0])
        crowBar();
}
